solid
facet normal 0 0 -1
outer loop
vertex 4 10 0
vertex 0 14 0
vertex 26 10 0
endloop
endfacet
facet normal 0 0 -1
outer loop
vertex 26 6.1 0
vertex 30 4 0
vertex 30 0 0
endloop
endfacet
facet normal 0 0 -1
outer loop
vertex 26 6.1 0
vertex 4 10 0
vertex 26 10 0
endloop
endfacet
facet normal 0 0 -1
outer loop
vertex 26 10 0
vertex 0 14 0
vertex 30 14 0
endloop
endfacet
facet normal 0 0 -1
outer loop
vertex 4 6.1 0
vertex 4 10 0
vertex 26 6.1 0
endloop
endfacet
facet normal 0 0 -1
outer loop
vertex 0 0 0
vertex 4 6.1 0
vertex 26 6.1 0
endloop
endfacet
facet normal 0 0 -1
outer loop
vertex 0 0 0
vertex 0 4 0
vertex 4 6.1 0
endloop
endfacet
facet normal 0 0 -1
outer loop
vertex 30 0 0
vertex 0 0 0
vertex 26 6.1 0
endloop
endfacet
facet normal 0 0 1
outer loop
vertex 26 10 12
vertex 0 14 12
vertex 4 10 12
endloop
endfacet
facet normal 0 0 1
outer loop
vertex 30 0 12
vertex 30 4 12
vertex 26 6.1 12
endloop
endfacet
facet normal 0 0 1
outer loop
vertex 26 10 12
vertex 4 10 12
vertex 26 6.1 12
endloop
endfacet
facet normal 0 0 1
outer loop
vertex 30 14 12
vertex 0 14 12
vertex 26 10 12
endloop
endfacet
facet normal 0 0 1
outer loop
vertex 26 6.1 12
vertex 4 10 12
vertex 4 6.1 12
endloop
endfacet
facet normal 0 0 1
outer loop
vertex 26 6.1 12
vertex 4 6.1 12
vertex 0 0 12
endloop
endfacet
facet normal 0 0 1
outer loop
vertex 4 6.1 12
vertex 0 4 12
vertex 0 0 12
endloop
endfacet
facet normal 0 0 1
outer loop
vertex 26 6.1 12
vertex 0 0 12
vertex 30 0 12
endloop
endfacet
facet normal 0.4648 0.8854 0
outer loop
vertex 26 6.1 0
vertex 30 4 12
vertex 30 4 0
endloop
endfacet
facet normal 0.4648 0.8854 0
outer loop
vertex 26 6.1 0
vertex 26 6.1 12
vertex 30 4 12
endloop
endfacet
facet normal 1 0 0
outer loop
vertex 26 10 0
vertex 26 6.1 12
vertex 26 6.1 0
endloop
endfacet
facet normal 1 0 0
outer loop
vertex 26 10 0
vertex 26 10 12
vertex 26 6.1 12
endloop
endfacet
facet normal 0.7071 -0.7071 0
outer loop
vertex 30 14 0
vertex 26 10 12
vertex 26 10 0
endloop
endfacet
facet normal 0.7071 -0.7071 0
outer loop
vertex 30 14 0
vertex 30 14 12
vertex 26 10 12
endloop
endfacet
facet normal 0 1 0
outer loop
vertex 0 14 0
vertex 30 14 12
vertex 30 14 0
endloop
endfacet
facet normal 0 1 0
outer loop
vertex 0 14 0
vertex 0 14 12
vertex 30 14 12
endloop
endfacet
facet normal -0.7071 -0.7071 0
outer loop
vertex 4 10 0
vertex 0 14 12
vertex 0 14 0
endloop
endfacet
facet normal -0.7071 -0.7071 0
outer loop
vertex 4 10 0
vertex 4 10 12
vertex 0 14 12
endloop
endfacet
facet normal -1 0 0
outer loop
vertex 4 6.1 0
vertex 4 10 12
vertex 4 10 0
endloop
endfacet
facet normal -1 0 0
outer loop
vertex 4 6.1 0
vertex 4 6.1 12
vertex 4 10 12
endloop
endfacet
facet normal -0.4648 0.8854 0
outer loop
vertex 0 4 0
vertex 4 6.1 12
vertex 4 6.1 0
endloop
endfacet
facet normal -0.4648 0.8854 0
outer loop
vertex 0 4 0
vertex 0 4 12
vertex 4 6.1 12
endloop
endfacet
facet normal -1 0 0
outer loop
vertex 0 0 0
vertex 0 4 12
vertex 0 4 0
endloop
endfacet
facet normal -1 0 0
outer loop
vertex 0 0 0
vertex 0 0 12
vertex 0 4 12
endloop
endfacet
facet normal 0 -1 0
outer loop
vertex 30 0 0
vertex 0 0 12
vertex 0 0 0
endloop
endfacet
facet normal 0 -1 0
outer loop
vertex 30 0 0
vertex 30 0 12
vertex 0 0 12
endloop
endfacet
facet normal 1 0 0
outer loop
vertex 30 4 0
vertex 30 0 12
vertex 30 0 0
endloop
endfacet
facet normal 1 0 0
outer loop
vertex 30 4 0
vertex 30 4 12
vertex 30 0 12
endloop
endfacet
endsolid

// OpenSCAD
$fn = 32;

// ----------------------------------------------------------------------
// Key bar: dovetail key, 12 mm thick
// ----------------------------------------------------------------------

// --- parameters (mm) ---
profile_height = 12;      // extrusion height
profile_points = 10;      // points of the closed outline

profile = [[0, 0], [30, 0], [30, 4], [26, 6.1], [26, 10], [30, 14], [0, 14], [4, 10], [4, 6.1], [0, 4]];  // single closed polygon, 10 points, counter clockwise

// --- the one profile operation ---
linear_extrude(height = profile_height) polygon(points = profile);
